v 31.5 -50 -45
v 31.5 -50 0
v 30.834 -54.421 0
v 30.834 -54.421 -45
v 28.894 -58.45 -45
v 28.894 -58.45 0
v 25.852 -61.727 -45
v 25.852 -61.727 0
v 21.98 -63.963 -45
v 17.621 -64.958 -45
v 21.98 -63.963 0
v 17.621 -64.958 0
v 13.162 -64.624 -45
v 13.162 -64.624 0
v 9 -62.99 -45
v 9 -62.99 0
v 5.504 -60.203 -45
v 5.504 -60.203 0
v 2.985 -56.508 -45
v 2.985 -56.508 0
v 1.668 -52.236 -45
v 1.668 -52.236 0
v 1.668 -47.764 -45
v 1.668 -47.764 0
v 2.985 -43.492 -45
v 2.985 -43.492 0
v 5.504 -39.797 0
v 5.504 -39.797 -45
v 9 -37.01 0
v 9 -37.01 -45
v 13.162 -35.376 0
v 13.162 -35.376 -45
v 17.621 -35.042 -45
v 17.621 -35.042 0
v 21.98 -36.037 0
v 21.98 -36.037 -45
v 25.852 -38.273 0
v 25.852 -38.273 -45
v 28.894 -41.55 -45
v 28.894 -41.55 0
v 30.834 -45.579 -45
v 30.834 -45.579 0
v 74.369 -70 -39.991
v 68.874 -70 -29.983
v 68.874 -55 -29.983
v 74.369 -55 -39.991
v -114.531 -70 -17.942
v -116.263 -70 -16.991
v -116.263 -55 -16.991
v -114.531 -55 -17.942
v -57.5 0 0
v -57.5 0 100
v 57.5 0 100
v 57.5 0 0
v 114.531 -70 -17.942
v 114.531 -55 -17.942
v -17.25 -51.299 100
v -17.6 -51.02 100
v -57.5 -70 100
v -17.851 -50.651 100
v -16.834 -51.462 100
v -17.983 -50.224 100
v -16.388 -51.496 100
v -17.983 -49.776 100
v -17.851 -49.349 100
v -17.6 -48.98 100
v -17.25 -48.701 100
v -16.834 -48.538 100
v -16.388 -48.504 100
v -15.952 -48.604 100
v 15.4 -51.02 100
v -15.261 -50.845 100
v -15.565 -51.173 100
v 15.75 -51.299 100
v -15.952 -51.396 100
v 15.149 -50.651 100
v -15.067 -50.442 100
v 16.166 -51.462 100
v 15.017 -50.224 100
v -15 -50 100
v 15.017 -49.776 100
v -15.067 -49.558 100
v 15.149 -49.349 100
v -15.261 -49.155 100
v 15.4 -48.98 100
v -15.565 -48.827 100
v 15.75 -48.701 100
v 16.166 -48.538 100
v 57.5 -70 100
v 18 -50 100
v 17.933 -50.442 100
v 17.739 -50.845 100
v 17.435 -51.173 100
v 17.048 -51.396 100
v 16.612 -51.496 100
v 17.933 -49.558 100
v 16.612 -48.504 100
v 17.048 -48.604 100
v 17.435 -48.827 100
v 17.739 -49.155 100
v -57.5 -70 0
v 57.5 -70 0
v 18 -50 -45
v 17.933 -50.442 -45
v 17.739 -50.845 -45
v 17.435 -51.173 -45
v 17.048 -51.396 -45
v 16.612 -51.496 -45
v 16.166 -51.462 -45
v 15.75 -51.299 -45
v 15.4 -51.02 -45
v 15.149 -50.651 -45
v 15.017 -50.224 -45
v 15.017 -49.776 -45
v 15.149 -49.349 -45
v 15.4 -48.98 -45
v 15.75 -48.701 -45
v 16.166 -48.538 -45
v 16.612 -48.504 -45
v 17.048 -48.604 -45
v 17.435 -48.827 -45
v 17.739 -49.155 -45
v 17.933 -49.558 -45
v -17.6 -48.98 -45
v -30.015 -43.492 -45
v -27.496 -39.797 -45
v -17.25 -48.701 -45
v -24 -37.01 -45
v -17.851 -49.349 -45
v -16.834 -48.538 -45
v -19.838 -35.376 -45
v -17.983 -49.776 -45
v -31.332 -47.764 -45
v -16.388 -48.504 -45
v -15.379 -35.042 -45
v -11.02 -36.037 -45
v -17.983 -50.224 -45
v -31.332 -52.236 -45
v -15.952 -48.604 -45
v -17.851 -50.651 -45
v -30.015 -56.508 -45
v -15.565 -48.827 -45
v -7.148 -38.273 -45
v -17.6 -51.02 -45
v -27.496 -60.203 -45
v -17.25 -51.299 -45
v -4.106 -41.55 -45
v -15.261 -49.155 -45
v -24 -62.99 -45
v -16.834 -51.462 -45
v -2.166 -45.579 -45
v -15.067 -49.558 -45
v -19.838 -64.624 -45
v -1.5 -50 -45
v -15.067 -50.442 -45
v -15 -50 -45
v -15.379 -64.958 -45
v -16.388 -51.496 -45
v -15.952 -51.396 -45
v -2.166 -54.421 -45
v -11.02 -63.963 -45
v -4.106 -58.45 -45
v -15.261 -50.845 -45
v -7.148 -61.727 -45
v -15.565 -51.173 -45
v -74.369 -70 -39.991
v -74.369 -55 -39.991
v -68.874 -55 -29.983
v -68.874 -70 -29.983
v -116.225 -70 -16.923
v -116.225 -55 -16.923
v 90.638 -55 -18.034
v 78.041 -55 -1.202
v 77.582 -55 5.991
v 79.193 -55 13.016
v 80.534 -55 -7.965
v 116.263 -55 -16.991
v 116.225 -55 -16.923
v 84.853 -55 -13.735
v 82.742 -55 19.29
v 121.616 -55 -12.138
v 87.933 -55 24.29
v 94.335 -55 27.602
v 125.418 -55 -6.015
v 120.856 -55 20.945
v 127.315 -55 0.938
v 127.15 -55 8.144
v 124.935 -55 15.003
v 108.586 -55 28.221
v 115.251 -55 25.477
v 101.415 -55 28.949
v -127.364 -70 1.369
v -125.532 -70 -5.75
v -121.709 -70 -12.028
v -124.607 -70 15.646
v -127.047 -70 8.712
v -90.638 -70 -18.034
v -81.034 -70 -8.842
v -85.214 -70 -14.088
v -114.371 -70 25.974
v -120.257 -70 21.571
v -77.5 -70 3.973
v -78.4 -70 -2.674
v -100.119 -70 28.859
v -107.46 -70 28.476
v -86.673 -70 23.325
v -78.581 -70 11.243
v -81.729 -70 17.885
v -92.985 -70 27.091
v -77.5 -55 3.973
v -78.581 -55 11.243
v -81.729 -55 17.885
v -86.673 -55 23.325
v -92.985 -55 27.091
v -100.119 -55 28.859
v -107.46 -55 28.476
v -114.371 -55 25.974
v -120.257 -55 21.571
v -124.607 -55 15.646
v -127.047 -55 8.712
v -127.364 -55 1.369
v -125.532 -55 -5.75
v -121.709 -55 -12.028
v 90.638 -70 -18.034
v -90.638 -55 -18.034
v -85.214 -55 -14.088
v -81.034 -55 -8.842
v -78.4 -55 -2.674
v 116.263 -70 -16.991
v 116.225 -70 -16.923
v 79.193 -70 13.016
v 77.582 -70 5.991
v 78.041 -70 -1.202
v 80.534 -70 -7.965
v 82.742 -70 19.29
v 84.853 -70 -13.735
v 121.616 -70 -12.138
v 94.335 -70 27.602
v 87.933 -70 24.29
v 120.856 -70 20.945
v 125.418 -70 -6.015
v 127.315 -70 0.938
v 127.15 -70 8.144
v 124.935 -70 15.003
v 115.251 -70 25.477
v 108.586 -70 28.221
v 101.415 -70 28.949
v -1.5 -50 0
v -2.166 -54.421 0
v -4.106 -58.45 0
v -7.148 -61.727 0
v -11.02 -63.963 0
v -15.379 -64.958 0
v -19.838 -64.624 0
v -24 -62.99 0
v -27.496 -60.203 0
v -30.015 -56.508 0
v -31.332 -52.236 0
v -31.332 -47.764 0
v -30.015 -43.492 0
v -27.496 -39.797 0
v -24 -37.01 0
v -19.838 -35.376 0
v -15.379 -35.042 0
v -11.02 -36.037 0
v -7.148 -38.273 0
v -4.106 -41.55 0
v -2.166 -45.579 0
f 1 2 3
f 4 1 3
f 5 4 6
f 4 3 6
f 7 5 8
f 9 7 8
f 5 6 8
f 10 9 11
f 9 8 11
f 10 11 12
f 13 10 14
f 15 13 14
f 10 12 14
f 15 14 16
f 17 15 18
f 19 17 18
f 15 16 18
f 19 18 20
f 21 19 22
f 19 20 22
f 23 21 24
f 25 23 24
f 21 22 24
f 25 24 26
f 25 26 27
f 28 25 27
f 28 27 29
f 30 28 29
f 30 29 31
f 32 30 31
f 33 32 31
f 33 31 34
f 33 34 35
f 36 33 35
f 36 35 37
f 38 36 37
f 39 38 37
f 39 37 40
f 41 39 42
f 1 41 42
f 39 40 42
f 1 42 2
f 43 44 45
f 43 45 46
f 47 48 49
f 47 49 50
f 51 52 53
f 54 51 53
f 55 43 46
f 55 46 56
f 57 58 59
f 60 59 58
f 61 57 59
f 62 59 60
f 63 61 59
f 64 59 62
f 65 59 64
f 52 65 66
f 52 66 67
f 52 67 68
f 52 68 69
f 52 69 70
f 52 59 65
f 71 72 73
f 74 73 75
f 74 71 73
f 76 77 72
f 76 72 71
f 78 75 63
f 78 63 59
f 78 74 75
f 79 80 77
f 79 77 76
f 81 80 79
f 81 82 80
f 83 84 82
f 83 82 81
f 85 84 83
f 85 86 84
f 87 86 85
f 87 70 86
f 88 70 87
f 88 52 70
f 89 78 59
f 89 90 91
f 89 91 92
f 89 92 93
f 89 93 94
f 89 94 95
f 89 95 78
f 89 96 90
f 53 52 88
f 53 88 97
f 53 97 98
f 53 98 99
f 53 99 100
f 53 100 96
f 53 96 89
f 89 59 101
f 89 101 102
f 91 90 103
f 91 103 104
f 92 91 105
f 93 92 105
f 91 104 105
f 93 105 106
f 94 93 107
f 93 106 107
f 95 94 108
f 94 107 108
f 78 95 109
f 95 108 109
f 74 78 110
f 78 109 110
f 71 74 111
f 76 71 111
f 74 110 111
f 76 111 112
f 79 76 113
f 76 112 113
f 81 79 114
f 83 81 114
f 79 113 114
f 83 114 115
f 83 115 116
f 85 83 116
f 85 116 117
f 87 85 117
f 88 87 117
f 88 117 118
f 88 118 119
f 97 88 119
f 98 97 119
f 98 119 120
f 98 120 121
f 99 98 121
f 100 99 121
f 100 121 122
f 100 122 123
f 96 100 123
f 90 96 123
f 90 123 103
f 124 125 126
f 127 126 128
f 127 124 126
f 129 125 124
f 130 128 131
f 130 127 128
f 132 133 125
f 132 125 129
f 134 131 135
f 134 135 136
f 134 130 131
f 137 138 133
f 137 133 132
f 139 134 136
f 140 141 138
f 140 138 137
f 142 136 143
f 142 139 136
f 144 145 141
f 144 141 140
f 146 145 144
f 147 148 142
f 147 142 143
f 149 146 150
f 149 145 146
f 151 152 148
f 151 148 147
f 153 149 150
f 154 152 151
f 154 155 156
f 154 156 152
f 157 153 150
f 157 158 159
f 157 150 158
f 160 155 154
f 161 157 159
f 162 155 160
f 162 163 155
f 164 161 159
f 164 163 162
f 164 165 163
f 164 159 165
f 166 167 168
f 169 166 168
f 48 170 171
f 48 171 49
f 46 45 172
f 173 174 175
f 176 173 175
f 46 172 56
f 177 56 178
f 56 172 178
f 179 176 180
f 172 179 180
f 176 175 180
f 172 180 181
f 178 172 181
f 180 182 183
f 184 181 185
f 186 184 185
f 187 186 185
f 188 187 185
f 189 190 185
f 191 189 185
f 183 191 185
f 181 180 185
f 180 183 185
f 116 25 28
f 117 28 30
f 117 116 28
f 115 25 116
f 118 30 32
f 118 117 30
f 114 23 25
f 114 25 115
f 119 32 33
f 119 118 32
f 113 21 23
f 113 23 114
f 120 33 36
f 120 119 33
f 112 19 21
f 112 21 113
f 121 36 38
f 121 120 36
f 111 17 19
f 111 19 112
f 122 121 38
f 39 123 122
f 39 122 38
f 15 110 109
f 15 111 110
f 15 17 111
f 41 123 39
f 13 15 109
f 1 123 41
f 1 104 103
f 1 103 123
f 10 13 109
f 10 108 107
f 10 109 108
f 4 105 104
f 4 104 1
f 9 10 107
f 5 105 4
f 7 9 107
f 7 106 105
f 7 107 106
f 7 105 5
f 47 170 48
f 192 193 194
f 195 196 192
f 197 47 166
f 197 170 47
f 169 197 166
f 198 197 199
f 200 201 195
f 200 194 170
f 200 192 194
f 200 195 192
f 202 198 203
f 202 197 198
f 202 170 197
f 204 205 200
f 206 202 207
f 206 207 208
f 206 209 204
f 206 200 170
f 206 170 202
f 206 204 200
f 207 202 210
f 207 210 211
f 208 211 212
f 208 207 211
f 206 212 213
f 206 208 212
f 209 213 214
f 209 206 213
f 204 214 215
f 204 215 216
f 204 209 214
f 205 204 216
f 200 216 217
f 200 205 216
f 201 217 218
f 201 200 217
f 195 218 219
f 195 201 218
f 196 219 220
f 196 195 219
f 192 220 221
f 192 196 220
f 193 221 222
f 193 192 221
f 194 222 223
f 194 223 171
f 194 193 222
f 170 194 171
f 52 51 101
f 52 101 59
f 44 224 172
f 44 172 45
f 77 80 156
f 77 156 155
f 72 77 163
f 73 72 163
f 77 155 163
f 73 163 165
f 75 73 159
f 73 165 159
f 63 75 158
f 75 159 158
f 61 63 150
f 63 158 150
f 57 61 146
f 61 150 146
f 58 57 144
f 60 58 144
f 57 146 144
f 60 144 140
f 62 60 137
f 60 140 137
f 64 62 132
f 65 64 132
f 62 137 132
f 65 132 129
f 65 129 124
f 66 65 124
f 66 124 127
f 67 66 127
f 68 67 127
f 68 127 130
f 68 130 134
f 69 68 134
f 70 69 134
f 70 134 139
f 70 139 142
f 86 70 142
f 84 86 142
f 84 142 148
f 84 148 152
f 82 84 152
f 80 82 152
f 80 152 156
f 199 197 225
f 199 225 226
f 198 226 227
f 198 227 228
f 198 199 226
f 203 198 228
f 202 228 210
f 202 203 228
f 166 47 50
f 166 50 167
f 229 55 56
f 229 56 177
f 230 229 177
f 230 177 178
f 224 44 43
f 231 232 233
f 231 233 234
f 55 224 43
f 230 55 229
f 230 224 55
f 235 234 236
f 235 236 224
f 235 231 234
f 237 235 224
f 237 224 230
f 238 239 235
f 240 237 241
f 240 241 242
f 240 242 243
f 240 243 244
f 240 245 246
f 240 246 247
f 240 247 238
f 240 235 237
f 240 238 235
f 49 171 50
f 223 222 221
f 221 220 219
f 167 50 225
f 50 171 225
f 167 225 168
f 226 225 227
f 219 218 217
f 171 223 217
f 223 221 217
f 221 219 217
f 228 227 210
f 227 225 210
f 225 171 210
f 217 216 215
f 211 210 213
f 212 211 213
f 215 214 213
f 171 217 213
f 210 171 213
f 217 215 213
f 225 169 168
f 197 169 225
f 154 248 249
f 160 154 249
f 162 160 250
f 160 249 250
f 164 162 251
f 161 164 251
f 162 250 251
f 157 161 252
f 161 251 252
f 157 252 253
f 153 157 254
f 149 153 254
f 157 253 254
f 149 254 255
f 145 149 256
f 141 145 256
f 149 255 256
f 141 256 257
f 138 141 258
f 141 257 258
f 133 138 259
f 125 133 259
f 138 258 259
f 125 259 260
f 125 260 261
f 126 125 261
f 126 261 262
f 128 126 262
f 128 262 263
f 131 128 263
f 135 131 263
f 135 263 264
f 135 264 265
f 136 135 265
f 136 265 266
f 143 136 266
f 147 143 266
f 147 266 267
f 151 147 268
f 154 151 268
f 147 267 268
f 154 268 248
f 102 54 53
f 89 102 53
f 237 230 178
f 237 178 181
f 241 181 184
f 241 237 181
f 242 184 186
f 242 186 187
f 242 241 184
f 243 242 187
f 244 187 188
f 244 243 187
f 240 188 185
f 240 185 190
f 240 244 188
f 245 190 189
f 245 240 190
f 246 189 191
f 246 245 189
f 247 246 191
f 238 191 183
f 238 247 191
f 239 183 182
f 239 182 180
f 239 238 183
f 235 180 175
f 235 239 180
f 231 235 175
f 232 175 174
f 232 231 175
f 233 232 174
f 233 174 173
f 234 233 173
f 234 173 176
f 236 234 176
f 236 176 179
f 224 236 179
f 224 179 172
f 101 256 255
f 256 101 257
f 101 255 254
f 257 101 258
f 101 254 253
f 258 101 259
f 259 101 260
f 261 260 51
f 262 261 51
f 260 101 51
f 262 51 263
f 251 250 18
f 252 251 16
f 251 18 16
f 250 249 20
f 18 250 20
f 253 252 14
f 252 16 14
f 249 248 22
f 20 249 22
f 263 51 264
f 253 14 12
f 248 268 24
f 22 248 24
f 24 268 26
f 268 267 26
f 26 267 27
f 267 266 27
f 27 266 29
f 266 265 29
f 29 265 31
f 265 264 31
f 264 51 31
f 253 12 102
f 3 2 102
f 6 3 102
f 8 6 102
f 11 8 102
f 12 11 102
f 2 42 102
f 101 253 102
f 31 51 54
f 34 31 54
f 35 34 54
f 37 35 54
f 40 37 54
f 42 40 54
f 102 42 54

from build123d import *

# Parameters (mm, degrees)
F0_W     = 115
F0_H     = 100
F1_DEPTH = 70
F2_R     = 15
F3_DEPTH = 45
F5_DEPTH = 15
F6_R     = 1.5
F7_DEPTH = 145.001


with BuildPart() as f1:
    # F0 (on Front) → F1 (new body)
    with BuildSketch(Plane.XZ):
        with Locations((0, 50)):
            Rectangle(F0_W, F0_H)
    extrude(amount=F1_DEPTH)

    # F2 (on face) → F3 (join)
    with BuildSketch(Plane(origin=(0, 0, 0), x_dir=(1, 0, 0), z_dir=(0, 0, -1))):
        with Locations((-16.5, 50)):
            Circle(F2_R)
        with Locations((16.5, 50)):
            Circle(F2_R)
    extrude(amount=F3_DEPTH)

    # F6 (on face) → F7 (cut, through all)
    with BuildSketch(Plane(origin=(0, 0, -45), x_dir=(1, 0, 0), z_dir=(0, 0, -1))):
        with Locations((-16.5, 50)):
            Circle(F6_R)
        with Locations((16.5, 50)):
            Circle(F6_R)
    extrude(amount=-F7_DEPTH, mode=Mode.SUBTRACT)


with BuildPart() as f5:
    # F4 (on face) → F5 (new body)
    with BuildSketch(Plane.XZ.offset(70)):
        with BuildLine():
            ThreePointArc((-90.6380236441, -18.0340784617), (-81.0343366175, -8.8424504028), (-77.5, 3.9725913666))
            ThreePointArc((-77.5, 3.9725913666), (-114.3714518406, 25.9741511112), (-116.2254904956, -16.9226451875))
            Line((-116.2254904956, -16.9226451875), (-110.7682311715, -6.9824300553))
            Line((-110.7682311715, -6.9824300553), (-90.6380236441, -18.0340784617))
        make_face()
        with BuildLine():
            Line((-110.7682311715, -6.9824300553), (-116.2254904956, -16.9226451875))
            ThreePointArc((-116.2254904956, -16.9226451875), (-115.3884653253, -17.4490673357), (-114.5312778232, -17.941978078))
            ThreePointArc((-114.5312778232, -17.941978078), (-102.5963657972, -21.0272229054), (-90.6380236441, -18.0340784617))
            Line((-90.6380236441, -18.0340784617), (-110.7682311715, -6.9824300553))
        make_face()
        with BuildLine():
            ThreePointArc((-114.5312778232, -17.941978078), (-115.3884653253, -17.4490673357), (-116.2254904956, -16.9226451875))
            Line((-116.2254904956, -16.9226451875), (-116.2631185248, -16.9911833828))
            Line((-116.2631185248, -16.9911833828), (-114.5312778232, -17.941978078))
        make_face()
        with BuildLine():
            Line((-68.8741824748, -29.9826050851), (-90.6380236441, -18.0340784617))
            ThreePointArc((-90.6380236441, -18.0340784617), (-102.5963657972, -21.0272229054), (-114.5312778232, -17.941978078))
            Line((-114.5312778232, -17.941978078), (-74.3690698281, -39.9913584125))
            Line((-74.3690698281, -39.9913584125), (-68.8741824748, -29.9826050851))
        make_face()
    extrude(amount=-F5_DEPTH)


with BuildPart() as f5b:
    # F4 (on face) → F5, piece 2 (new body)
    with BuildSketch(Plane.XZ.offset(70)):
        with BuildLine():
            Line((90.6380236441, -18.0340784617), (68.8741824748, -29.9826050851))
            Line((68.8741824748, -29.9826050851), (74.3690698281, -39.9913584125))
            Line((74.3690698281, -39.9913584125), (114.5312776752, -17.9419781592))
            ThreePointArc((114.5312776752, -17.9419781592), (102.5963657128, -21.0272229057), (90.6380236441, -18.0340784617))
        make_face()
        with BuildLine():
            ThreePointArc((127.5, 3.9725913666), (89.6849582306, 25.4382547491), (90.6380236441, -18.0340784617))
            Line((90.6380236441, -18.0340784617), (110.7682311715, -6.9824300553))
            Line((110.7682311715, -6.9824300553), (116.2254904956, -16.9226451875))
            ThreePointArc((116.2254904956, -16.9226451875), (124.5015597446, -7.898860474), (127.5, 3.9725913666))
        make_face()
        with BuildLine():
            Line((110.7682311715, -6.9824300553), (90.6380236441, -18.0340784617))
            ThreePointArc((90.6380236441, -18.0340784617), (102.5963657128, -21.0272229057), (114.5312776752, -17.9419781592))
            ThreePointArc((114.5312776752, -17.9419781592), (115.388465253, -17.4490673792), (116.2254904956, -16.9226451875))
            Line((116.2254904956, -16.9226451875), (110.7682311715, -6.9824300553))
        make_face()
        with BuildLine():
            ThreePointArc((116.2254904956, -16.9226451875), (115.388465253, -17.4490673792), (114.5312776752, -17.9419781592))
            Line((114.5312776752, -17.9419781592), (116.2631185248, -16.9911833828))
            Line((116.2631185248, -16.9911833828), (116.2254904956, -16.9226451875))
        make_face()
    extrude(amount=-F5_DEPTH)


solid = Compound([f1.part, f5.part, f5b.part])
